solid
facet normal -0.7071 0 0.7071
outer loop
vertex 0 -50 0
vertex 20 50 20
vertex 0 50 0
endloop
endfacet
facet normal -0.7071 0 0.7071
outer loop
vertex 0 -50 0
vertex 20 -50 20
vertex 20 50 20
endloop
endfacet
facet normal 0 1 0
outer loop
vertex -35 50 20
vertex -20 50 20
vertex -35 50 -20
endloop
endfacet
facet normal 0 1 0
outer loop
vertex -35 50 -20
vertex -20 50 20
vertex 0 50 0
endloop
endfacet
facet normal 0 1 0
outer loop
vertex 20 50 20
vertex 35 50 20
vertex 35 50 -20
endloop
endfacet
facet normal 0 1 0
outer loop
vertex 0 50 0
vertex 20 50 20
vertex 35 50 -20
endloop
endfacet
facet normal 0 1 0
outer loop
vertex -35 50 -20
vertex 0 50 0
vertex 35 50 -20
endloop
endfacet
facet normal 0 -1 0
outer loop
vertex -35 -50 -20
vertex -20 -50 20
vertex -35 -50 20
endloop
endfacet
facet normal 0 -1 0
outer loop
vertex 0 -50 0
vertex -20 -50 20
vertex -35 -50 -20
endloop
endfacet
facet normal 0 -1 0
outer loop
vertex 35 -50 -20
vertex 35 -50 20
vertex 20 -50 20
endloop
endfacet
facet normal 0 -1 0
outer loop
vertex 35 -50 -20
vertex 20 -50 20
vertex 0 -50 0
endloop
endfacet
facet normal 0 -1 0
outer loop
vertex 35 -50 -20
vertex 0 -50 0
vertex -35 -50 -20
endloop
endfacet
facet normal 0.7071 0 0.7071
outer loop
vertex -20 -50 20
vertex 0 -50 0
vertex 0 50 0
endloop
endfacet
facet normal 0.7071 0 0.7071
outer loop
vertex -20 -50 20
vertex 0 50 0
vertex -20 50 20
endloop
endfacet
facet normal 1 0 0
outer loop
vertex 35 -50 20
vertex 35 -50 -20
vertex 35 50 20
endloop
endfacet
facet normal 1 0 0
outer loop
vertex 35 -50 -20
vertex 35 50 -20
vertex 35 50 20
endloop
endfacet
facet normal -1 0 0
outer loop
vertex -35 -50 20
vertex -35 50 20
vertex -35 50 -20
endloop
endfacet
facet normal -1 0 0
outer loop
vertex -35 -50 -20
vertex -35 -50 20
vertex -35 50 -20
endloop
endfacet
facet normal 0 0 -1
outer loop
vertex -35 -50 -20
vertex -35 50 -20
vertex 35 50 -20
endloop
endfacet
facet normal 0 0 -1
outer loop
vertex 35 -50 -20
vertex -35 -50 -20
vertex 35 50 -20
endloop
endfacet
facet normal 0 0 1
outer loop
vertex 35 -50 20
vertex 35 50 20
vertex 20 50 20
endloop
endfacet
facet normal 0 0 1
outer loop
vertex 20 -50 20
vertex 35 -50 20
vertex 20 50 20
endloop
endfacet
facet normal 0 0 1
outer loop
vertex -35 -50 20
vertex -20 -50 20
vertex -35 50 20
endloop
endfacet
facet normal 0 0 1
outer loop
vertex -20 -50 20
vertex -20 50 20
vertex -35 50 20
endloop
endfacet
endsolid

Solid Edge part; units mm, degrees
sketch "Sketch1" plane through (0, 0, 0) normal (0, -1, 0) x (1, 0, 0)
  line L0 (-35, -20) -> (35, -20)
  line L1 (35, -20) -> (35, 20)
  line L2 (35, 20) -> (-35, 20)
  line L3 (-35, 20) -> (-35, -20)
  dimension "D1" = 70
  dimension "D2" = 40
extrude "Protrusion1" add sketch "Sketch1" along normal mid plane 100
sketch "Sketch2" plane through (0, -50, 0) normal (0, -1, 0) x (1, 0, 0)
  line L0 (0, 0) -> (-20, 20)
  line L1 (-20, 20) -> (20, 20)
  line L2 (20, 20) -> (0, 0)
  dimension "D1" = 40
extrude "Cutout1" cut sketch "Sketch2" against normal through all
